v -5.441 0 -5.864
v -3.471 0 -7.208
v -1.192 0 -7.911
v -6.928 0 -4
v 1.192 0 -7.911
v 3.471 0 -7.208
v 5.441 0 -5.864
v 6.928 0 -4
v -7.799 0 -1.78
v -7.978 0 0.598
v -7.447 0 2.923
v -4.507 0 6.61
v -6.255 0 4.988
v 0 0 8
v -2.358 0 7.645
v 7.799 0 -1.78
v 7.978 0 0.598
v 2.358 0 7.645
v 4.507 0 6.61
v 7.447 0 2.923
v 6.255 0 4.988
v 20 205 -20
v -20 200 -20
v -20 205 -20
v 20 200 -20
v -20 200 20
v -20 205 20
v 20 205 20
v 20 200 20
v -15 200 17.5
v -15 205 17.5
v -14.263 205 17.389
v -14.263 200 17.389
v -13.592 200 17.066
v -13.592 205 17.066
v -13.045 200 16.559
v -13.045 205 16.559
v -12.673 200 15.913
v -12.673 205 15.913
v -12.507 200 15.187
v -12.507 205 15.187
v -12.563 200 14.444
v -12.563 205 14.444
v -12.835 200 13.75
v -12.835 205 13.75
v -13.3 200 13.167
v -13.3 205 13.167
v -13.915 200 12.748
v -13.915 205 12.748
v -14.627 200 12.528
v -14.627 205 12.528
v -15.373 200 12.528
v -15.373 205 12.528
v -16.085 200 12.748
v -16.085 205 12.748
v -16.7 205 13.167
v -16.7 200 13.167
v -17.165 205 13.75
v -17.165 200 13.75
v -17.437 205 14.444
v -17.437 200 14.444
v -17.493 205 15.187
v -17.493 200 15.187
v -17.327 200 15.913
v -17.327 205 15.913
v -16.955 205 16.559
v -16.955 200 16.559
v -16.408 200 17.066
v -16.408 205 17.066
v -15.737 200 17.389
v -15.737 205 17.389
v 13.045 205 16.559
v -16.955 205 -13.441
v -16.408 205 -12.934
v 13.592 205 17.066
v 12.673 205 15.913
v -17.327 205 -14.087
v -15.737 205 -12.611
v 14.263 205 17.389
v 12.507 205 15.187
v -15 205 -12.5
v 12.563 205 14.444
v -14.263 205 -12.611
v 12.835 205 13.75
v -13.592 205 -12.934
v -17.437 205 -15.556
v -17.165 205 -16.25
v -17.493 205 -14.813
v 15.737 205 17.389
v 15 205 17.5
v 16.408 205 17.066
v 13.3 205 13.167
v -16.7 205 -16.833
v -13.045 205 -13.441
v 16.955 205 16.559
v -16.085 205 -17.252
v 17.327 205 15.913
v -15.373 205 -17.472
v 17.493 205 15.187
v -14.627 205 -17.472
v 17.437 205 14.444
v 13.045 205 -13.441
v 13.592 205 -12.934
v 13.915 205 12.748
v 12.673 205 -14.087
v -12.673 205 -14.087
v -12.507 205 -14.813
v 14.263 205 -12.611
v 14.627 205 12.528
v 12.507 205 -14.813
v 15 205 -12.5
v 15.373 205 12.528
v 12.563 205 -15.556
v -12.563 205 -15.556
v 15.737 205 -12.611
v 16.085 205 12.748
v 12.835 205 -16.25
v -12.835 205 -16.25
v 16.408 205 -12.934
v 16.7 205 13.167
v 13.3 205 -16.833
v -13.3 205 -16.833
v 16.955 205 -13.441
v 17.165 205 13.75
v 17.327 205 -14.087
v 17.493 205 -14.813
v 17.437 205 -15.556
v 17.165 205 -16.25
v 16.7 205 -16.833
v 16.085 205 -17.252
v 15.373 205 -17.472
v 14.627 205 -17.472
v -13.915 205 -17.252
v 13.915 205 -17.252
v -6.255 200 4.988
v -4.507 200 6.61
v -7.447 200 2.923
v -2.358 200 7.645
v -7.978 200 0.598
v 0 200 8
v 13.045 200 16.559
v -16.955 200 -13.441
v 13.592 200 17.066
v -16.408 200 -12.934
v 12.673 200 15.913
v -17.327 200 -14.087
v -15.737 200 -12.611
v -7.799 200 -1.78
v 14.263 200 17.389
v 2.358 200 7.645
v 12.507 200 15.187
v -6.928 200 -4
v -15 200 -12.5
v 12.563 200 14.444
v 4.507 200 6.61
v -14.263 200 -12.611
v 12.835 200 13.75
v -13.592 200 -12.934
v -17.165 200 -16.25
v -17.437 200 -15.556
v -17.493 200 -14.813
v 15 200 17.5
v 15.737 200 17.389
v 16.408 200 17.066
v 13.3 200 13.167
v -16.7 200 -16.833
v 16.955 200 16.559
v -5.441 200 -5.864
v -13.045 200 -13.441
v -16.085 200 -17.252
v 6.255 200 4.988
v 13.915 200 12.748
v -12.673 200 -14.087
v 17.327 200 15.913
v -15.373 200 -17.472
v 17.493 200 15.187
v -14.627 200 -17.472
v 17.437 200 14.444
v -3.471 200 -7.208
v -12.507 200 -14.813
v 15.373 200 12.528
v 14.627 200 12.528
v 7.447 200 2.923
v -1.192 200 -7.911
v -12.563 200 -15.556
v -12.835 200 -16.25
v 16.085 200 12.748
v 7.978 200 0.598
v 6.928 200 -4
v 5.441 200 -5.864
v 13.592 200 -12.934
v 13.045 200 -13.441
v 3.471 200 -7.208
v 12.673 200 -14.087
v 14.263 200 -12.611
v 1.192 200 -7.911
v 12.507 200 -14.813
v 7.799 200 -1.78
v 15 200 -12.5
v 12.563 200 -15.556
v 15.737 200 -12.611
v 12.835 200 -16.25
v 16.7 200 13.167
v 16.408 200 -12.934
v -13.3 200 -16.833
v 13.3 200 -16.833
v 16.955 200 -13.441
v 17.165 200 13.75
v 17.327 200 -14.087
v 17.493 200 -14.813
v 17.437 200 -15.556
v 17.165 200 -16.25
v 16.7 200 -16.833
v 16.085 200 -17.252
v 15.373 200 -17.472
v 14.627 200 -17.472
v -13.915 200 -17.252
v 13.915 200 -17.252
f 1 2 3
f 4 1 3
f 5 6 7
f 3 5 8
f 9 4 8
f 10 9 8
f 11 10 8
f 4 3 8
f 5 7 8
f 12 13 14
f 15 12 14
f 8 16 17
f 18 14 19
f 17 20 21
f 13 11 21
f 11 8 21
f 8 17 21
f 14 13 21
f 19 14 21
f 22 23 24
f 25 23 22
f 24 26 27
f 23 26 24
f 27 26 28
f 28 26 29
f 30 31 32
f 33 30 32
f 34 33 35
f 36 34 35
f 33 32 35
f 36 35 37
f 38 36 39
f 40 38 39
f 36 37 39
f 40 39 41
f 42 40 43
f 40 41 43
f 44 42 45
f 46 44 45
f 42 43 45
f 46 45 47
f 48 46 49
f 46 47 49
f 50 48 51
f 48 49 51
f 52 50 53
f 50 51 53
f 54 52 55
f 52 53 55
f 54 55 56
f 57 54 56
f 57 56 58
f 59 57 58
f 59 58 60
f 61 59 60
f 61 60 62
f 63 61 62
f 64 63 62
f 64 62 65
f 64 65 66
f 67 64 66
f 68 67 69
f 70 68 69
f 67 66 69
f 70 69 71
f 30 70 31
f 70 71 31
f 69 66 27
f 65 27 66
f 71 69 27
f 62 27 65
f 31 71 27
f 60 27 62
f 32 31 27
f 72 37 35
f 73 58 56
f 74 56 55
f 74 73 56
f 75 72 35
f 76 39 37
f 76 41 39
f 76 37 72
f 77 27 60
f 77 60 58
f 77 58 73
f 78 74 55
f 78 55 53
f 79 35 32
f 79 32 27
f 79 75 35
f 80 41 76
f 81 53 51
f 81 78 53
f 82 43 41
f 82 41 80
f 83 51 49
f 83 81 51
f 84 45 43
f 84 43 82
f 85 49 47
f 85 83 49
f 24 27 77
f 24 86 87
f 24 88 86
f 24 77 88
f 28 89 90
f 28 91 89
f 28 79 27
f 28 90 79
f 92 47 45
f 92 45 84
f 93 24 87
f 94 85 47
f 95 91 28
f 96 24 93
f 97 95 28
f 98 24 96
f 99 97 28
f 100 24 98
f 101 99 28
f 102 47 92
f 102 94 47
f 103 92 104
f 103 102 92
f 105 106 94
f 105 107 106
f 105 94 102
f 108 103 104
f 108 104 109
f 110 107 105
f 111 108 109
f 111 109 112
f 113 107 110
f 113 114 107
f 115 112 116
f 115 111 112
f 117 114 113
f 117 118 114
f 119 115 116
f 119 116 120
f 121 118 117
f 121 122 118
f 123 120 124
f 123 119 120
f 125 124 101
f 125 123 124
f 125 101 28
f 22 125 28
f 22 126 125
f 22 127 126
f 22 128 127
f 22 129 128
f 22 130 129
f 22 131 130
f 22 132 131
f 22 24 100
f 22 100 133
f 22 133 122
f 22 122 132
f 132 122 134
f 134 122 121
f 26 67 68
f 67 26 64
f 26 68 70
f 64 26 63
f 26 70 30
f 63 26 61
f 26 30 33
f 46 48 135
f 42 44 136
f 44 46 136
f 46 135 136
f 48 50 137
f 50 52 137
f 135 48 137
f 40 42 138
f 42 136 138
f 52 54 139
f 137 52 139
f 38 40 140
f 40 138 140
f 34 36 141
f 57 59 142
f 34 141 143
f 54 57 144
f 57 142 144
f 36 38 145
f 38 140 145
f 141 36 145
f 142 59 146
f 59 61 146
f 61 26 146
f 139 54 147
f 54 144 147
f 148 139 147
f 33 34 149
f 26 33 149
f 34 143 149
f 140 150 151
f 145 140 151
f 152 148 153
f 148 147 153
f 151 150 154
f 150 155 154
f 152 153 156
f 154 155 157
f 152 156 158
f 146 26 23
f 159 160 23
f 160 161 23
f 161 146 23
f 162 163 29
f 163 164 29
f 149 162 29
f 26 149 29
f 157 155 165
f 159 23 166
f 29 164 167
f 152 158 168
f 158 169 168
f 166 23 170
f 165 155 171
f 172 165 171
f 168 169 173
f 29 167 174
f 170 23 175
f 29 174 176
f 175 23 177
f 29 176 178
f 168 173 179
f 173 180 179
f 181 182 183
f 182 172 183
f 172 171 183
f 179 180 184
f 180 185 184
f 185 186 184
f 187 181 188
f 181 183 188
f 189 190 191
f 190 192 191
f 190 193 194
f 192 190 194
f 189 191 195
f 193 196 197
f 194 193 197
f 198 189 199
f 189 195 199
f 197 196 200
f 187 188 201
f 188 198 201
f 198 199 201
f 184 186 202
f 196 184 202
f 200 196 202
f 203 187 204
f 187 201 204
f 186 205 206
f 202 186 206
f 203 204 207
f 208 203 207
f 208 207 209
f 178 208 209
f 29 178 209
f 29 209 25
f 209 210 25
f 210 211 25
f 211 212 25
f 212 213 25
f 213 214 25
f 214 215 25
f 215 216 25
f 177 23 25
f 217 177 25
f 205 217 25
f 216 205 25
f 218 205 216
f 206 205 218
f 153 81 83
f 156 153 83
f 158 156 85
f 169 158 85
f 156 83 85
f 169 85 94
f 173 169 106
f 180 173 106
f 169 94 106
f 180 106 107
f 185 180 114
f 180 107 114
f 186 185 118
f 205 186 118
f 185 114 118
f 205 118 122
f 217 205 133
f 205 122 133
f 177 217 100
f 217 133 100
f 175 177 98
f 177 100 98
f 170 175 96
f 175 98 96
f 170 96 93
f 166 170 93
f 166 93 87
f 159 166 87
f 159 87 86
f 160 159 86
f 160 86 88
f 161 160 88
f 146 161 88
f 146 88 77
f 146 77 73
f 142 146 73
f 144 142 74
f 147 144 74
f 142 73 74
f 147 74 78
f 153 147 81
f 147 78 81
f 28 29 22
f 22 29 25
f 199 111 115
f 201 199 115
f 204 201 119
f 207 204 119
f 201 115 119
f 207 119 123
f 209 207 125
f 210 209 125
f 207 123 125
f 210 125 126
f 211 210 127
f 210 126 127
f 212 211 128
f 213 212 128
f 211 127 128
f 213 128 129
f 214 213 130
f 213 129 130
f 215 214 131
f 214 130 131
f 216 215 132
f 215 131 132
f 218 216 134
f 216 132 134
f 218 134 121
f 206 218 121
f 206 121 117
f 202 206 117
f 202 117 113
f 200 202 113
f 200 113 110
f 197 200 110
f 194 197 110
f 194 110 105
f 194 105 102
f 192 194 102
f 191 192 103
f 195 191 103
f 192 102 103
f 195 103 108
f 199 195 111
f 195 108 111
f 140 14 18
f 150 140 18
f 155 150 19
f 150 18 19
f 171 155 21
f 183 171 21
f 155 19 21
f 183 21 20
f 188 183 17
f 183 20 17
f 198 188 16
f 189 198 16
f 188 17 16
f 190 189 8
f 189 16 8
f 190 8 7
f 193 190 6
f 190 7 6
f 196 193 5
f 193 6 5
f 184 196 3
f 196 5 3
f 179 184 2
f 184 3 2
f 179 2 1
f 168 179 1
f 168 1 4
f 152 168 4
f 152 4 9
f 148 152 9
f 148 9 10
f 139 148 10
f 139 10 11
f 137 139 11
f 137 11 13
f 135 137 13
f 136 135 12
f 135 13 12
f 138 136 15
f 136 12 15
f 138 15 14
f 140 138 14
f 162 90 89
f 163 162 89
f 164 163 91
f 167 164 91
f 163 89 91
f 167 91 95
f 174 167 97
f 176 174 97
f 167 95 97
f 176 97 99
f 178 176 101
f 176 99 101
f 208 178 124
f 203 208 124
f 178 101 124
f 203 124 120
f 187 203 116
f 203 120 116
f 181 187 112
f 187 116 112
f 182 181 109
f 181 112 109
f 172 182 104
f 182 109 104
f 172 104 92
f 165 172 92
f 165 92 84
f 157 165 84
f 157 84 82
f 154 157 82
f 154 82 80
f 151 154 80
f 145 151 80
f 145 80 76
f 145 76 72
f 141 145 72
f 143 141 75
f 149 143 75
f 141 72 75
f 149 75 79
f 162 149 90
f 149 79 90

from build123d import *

# Parameters (mm, degrees)
SKETCH_1_R          = 8
EXTRUDE_1_DEPTH     = 200
SKETCH_2_W          = 40
SKETCH_2_H          = 40
EXTRUDE_2_DEPTH     = 5
SKETCH_3_R          = 2.5
CUT_EXTRUDE_1_DEPTH = 5


with BuildPart() as part:
    # 草图1 → 凸台-拉伸1 (new body)
    with BuildSketch(Plane(origin=(0, 0, 0), x_dir=(1, 0, 0), z_dir=(0, 1, 0))):
        with Locations(Location((0, 0, 0), (0, 0, 270))):
            Circle(SKETCH_1_R)
    extrude(amount=EXTRUDE_1_DEPTH)

    # 草图2 → 凸台-拉伸2 (add)
    with BuildSketch(Plane(origin=(0, 200, 0), x_dir=(1, 0, 0), z_dir=(0, 1, 0))):
        Rectangle(SKETCH_2_W, SKETCH_2_H)
    extrude(amount=EXTRUDE_2_DEPTH)

    # 草图3 → 切除-拉伸1 (cut)
    with BuildSketch(Plane(origin=(0, 205, 0), x_dir=(1, 0, 0), z_dir=(0, 1, 0))):
        with Locations(Location((-15, 15, 0), (0, 0, 270))):
            Circle(SKETCH_3_R)
        with Locations(Location((15, 15, 0), (0, 0, 270))):
            Circle(SKETCH_3_R)
        with Locations(Location((15, -15, 0), (0, 0, 270))):
            Circle(SKETCH_3_R)
        with Locations(Location((-15, -15, 0), (0, 0, 270))):
            Circle(SKETCH_3_R)
    extrude(amount=-CUT_EXTRUDE_1_DEPTH, mode=Mode.SUBTRACT)


solid = part.part
